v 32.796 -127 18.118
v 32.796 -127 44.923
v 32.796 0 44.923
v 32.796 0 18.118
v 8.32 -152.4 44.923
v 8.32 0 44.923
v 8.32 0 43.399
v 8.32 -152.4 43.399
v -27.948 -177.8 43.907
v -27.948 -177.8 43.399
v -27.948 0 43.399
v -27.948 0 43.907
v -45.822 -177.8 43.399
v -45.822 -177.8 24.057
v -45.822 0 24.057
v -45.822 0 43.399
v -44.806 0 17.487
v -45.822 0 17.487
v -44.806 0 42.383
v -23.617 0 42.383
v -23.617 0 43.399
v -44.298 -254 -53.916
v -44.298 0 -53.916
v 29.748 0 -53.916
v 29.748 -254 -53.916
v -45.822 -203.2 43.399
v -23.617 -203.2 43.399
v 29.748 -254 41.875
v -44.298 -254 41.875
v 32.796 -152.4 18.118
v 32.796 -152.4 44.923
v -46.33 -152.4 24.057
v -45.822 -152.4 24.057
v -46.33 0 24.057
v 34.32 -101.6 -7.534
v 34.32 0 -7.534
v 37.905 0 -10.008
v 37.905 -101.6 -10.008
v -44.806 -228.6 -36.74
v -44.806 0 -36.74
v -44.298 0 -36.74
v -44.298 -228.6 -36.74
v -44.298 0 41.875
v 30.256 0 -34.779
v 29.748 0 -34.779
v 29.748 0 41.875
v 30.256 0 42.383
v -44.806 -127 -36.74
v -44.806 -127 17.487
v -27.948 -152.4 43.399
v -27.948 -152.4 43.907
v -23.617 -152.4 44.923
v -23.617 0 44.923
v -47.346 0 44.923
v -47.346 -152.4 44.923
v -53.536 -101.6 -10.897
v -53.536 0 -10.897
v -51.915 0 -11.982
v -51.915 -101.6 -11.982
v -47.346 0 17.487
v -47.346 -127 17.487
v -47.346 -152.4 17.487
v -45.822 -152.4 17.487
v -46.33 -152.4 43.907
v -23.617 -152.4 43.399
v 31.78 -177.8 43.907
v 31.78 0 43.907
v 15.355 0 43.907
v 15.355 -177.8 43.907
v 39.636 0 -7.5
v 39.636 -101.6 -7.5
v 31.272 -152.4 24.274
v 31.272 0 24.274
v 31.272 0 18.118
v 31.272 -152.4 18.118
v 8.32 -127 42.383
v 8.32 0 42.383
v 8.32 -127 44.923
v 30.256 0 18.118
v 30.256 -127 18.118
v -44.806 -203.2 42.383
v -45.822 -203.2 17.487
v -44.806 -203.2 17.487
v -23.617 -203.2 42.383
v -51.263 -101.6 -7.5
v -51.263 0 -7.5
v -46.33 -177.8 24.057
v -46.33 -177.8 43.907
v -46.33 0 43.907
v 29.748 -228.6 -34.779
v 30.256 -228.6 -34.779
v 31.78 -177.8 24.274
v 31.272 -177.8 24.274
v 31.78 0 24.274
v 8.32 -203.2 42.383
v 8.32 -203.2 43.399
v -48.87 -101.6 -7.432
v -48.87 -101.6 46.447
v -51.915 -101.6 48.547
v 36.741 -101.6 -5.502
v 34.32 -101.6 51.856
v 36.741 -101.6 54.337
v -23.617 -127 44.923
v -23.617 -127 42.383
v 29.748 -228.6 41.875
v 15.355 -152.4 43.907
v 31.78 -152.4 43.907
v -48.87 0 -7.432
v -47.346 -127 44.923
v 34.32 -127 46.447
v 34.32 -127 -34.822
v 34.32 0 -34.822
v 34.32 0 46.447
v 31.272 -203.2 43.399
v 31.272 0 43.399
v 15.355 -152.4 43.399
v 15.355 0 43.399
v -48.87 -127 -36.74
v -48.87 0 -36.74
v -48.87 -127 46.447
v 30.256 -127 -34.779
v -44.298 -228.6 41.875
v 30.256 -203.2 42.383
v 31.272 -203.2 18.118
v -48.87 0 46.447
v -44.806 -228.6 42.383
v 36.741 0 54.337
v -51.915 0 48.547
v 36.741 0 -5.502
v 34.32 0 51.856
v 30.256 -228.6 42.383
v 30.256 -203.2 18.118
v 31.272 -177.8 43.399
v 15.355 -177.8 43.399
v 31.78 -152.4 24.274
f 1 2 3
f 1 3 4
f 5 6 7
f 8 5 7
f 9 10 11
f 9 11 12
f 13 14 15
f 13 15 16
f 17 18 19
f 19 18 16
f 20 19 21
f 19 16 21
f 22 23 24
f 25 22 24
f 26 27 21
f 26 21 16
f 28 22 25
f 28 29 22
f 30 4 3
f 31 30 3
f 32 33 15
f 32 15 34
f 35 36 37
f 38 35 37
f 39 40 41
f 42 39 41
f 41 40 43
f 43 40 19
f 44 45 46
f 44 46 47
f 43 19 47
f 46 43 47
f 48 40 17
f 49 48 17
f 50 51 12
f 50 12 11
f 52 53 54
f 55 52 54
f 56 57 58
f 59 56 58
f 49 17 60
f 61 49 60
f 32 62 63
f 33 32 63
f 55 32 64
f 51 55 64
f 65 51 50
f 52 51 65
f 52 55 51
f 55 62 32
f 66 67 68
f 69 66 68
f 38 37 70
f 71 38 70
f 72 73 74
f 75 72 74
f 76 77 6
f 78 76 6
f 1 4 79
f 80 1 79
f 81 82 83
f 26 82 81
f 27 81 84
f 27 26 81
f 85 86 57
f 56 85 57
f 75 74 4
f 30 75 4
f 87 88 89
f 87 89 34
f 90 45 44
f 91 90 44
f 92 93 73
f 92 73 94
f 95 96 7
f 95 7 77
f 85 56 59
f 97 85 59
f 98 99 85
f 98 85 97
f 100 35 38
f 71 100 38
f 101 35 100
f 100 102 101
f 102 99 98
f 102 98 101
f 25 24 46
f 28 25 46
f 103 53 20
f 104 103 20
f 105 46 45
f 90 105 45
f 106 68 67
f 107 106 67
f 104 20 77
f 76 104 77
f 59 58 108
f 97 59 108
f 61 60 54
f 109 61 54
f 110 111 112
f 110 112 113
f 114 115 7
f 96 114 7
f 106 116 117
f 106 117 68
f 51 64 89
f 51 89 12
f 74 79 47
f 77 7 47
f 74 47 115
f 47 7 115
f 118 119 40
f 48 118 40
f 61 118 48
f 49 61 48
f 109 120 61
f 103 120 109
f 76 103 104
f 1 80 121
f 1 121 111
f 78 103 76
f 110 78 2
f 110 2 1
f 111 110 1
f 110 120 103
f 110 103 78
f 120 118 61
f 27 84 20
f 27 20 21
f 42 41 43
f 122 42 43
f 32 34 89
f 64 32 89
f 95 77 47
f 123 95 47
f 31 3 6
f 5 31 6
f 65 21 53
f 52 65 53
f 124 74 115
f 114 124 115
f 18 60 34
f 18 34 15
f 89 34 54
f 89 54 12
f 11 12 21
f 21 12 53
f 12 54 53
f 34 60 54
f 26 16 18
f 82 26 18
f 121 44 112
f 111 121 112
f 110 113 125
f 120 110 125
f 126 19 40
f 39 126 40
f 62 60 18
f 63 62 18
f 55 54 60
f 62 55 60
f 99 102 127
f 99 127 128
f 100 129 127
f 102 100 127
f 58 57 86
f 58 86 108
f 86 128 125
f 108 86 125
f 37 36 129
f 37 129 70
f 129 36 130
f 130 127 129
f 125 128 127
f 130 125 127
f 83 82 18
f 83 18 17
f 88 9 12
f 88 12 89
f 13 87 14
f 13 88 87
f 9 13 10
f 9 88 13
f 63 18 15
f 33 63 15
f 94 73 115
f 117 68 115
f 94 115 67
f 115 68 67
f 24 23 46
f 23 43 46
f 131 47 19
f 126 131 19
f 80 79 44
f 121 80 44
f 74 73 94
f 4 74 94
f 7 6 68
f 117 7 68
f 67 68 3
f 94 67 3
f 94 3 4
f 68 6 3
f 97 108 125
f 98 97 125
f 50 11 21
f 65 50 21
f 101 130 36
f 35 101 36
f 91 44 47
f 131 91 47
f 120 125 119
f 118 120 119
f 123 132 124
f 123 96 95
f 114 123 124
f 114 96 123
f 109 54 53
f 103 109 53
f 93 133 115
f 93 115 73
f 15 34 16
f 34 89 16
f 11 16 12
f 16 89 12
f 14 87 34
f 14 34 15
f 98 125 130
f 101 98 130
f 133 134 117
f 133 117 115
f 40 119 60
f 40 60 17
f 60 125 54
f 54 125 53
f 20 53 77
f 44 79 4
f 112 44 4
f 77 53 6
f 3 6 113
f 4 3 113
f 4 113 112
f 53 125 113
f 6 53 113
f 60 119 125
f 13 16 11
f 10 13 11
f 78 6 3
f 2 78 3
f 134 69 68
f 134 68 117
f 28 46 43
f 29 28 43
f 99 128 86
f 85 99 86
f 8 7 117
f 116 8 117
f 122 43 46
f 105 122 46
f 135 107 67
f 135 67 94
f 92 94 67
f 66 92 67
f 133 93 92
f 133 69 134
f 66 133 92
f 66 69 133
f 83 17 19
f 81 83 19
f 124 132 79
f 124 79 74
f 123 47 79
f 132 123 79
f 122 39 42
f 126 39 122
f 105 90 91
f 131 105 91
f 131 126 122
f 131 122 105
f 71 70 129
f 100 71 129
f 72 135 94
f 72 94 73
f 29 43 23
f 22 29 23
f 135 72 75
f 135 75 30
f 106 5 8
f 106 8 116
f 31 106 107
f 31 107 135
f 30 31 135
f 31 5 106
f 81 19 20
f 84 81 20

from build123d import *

# Parameters (mm, degrees)
F1_DEPTH  = 254
F2_DEPTH  = 228.6
F3_DEPTH  = 203.2
F4_DEPTH  = 177.8
F5_DEPTH  = 152.4
F6_DEPTH  = 203.2
F7_DEPTH  = 177.8
F8_DEPTH  = 152.4
F9_DEPTH  = 127
F10_DEPTH = 101.6


with BuildPart() as f1:
    # F0 (on Front) → F1 (new body)
    with BuildSketch(Plane.XZ):
        Polygon((-44.298312, -36.739912), (-44.298312, -53.916227), (29.747834, -53.916227), (29.747834, -34.778729), (29.747834, 41.874755), (-44.298312, 41.874755), align=None)
    extrude(amount=F1_DEPTH)


with BuildPart() as f2:
    # F0 (on Front) → F2 (new body)
    with BuildSketch(Plane.XZ):
        Polygon((-44.806312, -36.739912), (-44.298312, -36.739912), (-44.298312, 41.874755), (29.747834, 41.874755), (29.747834, -34.778729), (30.255834, -34.778729), (30.255834, 18.118348), (30.255834, 42.382755), (8.319654, 42.382755), (-23.616945, 42.382755), (-44.806312, 42.382755), (-44.806312, 17.486811), align=None)
    extrude(amount=F2_DEPTH)


with BuildPart() as f3:
    # F0 (on Front) → F3 (new body)
    with BuildSketch(Plane.XZ):
        Polygon((-45.822312, 17.486811), (-44.806312, 17.486811), (-44.806312, 42.382755), (-23.616945, 42.382755), (-23.616945, 43.398755), (-27.948299, 43.398755), (-45.822312, 43.398755), (-45.822312, 24.056775), align=None)
    extrude(amount=F3_DEPTH)


with BuildPart() as f4:
    # F0 (on Front) → F4 (new body)
    with BuildSketch(Plane.XZ):
        Polygon((-46.330312, 24.056775), (-45.822312, 24.056775), (-45.822312, 43.398755), (-27.948299, 43.398755), (-27.948299, 43.906755), (-46.330312, 43.906755), align=None)
    extrude(amount=F4_DEPTH)


with BuildPart() as f5:
    # F0 (on Front) → F5 (new body)
    with BuildSketch(Plane.XZ):
        Polygon((-47.346312, 17.486811), (-45.822312, 17.486811), (-45.822312, 24.056775), (-46.330312, 24.056775), (-46.330312, 43.906755), (-27.948299, 43.906755), (-27.948299, 43.398755), (-23.616945, 43.398755), (-23.616945, 44.922755), (-47.346312, 44.922755), align=None)
    extrude(amount=F5_DEPTH)


with BuildPart() as f6:
    # F0 (on Front) → F6 (new body)
    with BuildSketch(Plane.XZ):
        Polygon((30.255834, 42.382755), (30.255834, 18.118348), (31.271834, 18.118348), (31.271834, 24.274269), (31.271834, 43.398755), (15.354994, 43.398755), (8.319654, 43.398755), (8.319654, 42.382755), align=None)
    extrude(amount=F6_DEPTH)


with BuildPart() as f7:
    # F0 (on Front) → F7 (new body)
    with BuildSketch(Plane.XZ):
        Polygon((31.271834, 43.398755), (31.271834, 24.274269), (31.779834, 24.274269), (31.779834, 43.906755), (15.354994, 43.906755), (15.354994, 43.398755), align=None)
    extrude(amount=F7_DEPTH)


with BuildPart() as f8:
    # F0 (on Front) → F8 (new body)
    with BuildSketch(Plane.XZ):
        Polygon((31.271834, 24.274269), (31.271834, 18.118348), (32.795834, 18.118348), (32.795834, 44.922755), (8.319654, 44.922755), (8.319654, 43.398755), (15.354994, 43.398755), (15.354994, 43.906755), (31.779834, 43.906755), (31.779834, 24.274269), align=None)
    extrude(amount=F8_DEPTH)


with BuildPart() as f9:
    # F0 (on Front) → F9 (new body)
    with BuildSketch(Plane.XZ):
        Polygon((-48.870312, -36.739912), (-44.806312, -36.739912), (-44.806312, 17.486811), (-45.822312, 17.486811), (-47.346312, 17.486811), (-47.346312, 44.922755), (-23.616945, 44.922755), (-23.616945, 43.398755), (-23.616945, 42.382755), (8.319654, 42.382755), (8.319654, 43.398755), (8.319654, 44.922755), (32.795834, 44.922755), (32.795834, 18.118348), (31.271834, 18.118348), (30.255834, 18.118348), (30.255834, -34.778729), (34.319609, -34.821534), (34.319609, -7.533646), (34.319609, 46.446755), (-48.870312, 46.446755), (-48.870312, -7.431835), align=None)
    extrude(amount=F9_DEPTH)


with BuildPart() as f10:
    # F0 (on Front) → F10 (new body)
    with BuildSketch(Plane.XZ):
        Polygon((-51.914565, -11.981806), (-48.870312, -7.431835), (-48.870312, 46.446755), (34.319609, 51.855665), (34.319609, 46.446755), (34.319609, -7.533646), (37.905118, -10.008302), (39.636359, -7.499922), (36.740925, -5.501544), (36.740925, 54.337468), (-51.914565, 48.546594), (-51.262777, -7.499922), (-53.535745, -10.897122), align=None)
    extrude(amount=F10_DEPTH)


solid = Compound([f1.part, f2.part, f3.part, f4.part, f5.part, f6.part, f7.part, f8.part, f9.part, f10.part])
